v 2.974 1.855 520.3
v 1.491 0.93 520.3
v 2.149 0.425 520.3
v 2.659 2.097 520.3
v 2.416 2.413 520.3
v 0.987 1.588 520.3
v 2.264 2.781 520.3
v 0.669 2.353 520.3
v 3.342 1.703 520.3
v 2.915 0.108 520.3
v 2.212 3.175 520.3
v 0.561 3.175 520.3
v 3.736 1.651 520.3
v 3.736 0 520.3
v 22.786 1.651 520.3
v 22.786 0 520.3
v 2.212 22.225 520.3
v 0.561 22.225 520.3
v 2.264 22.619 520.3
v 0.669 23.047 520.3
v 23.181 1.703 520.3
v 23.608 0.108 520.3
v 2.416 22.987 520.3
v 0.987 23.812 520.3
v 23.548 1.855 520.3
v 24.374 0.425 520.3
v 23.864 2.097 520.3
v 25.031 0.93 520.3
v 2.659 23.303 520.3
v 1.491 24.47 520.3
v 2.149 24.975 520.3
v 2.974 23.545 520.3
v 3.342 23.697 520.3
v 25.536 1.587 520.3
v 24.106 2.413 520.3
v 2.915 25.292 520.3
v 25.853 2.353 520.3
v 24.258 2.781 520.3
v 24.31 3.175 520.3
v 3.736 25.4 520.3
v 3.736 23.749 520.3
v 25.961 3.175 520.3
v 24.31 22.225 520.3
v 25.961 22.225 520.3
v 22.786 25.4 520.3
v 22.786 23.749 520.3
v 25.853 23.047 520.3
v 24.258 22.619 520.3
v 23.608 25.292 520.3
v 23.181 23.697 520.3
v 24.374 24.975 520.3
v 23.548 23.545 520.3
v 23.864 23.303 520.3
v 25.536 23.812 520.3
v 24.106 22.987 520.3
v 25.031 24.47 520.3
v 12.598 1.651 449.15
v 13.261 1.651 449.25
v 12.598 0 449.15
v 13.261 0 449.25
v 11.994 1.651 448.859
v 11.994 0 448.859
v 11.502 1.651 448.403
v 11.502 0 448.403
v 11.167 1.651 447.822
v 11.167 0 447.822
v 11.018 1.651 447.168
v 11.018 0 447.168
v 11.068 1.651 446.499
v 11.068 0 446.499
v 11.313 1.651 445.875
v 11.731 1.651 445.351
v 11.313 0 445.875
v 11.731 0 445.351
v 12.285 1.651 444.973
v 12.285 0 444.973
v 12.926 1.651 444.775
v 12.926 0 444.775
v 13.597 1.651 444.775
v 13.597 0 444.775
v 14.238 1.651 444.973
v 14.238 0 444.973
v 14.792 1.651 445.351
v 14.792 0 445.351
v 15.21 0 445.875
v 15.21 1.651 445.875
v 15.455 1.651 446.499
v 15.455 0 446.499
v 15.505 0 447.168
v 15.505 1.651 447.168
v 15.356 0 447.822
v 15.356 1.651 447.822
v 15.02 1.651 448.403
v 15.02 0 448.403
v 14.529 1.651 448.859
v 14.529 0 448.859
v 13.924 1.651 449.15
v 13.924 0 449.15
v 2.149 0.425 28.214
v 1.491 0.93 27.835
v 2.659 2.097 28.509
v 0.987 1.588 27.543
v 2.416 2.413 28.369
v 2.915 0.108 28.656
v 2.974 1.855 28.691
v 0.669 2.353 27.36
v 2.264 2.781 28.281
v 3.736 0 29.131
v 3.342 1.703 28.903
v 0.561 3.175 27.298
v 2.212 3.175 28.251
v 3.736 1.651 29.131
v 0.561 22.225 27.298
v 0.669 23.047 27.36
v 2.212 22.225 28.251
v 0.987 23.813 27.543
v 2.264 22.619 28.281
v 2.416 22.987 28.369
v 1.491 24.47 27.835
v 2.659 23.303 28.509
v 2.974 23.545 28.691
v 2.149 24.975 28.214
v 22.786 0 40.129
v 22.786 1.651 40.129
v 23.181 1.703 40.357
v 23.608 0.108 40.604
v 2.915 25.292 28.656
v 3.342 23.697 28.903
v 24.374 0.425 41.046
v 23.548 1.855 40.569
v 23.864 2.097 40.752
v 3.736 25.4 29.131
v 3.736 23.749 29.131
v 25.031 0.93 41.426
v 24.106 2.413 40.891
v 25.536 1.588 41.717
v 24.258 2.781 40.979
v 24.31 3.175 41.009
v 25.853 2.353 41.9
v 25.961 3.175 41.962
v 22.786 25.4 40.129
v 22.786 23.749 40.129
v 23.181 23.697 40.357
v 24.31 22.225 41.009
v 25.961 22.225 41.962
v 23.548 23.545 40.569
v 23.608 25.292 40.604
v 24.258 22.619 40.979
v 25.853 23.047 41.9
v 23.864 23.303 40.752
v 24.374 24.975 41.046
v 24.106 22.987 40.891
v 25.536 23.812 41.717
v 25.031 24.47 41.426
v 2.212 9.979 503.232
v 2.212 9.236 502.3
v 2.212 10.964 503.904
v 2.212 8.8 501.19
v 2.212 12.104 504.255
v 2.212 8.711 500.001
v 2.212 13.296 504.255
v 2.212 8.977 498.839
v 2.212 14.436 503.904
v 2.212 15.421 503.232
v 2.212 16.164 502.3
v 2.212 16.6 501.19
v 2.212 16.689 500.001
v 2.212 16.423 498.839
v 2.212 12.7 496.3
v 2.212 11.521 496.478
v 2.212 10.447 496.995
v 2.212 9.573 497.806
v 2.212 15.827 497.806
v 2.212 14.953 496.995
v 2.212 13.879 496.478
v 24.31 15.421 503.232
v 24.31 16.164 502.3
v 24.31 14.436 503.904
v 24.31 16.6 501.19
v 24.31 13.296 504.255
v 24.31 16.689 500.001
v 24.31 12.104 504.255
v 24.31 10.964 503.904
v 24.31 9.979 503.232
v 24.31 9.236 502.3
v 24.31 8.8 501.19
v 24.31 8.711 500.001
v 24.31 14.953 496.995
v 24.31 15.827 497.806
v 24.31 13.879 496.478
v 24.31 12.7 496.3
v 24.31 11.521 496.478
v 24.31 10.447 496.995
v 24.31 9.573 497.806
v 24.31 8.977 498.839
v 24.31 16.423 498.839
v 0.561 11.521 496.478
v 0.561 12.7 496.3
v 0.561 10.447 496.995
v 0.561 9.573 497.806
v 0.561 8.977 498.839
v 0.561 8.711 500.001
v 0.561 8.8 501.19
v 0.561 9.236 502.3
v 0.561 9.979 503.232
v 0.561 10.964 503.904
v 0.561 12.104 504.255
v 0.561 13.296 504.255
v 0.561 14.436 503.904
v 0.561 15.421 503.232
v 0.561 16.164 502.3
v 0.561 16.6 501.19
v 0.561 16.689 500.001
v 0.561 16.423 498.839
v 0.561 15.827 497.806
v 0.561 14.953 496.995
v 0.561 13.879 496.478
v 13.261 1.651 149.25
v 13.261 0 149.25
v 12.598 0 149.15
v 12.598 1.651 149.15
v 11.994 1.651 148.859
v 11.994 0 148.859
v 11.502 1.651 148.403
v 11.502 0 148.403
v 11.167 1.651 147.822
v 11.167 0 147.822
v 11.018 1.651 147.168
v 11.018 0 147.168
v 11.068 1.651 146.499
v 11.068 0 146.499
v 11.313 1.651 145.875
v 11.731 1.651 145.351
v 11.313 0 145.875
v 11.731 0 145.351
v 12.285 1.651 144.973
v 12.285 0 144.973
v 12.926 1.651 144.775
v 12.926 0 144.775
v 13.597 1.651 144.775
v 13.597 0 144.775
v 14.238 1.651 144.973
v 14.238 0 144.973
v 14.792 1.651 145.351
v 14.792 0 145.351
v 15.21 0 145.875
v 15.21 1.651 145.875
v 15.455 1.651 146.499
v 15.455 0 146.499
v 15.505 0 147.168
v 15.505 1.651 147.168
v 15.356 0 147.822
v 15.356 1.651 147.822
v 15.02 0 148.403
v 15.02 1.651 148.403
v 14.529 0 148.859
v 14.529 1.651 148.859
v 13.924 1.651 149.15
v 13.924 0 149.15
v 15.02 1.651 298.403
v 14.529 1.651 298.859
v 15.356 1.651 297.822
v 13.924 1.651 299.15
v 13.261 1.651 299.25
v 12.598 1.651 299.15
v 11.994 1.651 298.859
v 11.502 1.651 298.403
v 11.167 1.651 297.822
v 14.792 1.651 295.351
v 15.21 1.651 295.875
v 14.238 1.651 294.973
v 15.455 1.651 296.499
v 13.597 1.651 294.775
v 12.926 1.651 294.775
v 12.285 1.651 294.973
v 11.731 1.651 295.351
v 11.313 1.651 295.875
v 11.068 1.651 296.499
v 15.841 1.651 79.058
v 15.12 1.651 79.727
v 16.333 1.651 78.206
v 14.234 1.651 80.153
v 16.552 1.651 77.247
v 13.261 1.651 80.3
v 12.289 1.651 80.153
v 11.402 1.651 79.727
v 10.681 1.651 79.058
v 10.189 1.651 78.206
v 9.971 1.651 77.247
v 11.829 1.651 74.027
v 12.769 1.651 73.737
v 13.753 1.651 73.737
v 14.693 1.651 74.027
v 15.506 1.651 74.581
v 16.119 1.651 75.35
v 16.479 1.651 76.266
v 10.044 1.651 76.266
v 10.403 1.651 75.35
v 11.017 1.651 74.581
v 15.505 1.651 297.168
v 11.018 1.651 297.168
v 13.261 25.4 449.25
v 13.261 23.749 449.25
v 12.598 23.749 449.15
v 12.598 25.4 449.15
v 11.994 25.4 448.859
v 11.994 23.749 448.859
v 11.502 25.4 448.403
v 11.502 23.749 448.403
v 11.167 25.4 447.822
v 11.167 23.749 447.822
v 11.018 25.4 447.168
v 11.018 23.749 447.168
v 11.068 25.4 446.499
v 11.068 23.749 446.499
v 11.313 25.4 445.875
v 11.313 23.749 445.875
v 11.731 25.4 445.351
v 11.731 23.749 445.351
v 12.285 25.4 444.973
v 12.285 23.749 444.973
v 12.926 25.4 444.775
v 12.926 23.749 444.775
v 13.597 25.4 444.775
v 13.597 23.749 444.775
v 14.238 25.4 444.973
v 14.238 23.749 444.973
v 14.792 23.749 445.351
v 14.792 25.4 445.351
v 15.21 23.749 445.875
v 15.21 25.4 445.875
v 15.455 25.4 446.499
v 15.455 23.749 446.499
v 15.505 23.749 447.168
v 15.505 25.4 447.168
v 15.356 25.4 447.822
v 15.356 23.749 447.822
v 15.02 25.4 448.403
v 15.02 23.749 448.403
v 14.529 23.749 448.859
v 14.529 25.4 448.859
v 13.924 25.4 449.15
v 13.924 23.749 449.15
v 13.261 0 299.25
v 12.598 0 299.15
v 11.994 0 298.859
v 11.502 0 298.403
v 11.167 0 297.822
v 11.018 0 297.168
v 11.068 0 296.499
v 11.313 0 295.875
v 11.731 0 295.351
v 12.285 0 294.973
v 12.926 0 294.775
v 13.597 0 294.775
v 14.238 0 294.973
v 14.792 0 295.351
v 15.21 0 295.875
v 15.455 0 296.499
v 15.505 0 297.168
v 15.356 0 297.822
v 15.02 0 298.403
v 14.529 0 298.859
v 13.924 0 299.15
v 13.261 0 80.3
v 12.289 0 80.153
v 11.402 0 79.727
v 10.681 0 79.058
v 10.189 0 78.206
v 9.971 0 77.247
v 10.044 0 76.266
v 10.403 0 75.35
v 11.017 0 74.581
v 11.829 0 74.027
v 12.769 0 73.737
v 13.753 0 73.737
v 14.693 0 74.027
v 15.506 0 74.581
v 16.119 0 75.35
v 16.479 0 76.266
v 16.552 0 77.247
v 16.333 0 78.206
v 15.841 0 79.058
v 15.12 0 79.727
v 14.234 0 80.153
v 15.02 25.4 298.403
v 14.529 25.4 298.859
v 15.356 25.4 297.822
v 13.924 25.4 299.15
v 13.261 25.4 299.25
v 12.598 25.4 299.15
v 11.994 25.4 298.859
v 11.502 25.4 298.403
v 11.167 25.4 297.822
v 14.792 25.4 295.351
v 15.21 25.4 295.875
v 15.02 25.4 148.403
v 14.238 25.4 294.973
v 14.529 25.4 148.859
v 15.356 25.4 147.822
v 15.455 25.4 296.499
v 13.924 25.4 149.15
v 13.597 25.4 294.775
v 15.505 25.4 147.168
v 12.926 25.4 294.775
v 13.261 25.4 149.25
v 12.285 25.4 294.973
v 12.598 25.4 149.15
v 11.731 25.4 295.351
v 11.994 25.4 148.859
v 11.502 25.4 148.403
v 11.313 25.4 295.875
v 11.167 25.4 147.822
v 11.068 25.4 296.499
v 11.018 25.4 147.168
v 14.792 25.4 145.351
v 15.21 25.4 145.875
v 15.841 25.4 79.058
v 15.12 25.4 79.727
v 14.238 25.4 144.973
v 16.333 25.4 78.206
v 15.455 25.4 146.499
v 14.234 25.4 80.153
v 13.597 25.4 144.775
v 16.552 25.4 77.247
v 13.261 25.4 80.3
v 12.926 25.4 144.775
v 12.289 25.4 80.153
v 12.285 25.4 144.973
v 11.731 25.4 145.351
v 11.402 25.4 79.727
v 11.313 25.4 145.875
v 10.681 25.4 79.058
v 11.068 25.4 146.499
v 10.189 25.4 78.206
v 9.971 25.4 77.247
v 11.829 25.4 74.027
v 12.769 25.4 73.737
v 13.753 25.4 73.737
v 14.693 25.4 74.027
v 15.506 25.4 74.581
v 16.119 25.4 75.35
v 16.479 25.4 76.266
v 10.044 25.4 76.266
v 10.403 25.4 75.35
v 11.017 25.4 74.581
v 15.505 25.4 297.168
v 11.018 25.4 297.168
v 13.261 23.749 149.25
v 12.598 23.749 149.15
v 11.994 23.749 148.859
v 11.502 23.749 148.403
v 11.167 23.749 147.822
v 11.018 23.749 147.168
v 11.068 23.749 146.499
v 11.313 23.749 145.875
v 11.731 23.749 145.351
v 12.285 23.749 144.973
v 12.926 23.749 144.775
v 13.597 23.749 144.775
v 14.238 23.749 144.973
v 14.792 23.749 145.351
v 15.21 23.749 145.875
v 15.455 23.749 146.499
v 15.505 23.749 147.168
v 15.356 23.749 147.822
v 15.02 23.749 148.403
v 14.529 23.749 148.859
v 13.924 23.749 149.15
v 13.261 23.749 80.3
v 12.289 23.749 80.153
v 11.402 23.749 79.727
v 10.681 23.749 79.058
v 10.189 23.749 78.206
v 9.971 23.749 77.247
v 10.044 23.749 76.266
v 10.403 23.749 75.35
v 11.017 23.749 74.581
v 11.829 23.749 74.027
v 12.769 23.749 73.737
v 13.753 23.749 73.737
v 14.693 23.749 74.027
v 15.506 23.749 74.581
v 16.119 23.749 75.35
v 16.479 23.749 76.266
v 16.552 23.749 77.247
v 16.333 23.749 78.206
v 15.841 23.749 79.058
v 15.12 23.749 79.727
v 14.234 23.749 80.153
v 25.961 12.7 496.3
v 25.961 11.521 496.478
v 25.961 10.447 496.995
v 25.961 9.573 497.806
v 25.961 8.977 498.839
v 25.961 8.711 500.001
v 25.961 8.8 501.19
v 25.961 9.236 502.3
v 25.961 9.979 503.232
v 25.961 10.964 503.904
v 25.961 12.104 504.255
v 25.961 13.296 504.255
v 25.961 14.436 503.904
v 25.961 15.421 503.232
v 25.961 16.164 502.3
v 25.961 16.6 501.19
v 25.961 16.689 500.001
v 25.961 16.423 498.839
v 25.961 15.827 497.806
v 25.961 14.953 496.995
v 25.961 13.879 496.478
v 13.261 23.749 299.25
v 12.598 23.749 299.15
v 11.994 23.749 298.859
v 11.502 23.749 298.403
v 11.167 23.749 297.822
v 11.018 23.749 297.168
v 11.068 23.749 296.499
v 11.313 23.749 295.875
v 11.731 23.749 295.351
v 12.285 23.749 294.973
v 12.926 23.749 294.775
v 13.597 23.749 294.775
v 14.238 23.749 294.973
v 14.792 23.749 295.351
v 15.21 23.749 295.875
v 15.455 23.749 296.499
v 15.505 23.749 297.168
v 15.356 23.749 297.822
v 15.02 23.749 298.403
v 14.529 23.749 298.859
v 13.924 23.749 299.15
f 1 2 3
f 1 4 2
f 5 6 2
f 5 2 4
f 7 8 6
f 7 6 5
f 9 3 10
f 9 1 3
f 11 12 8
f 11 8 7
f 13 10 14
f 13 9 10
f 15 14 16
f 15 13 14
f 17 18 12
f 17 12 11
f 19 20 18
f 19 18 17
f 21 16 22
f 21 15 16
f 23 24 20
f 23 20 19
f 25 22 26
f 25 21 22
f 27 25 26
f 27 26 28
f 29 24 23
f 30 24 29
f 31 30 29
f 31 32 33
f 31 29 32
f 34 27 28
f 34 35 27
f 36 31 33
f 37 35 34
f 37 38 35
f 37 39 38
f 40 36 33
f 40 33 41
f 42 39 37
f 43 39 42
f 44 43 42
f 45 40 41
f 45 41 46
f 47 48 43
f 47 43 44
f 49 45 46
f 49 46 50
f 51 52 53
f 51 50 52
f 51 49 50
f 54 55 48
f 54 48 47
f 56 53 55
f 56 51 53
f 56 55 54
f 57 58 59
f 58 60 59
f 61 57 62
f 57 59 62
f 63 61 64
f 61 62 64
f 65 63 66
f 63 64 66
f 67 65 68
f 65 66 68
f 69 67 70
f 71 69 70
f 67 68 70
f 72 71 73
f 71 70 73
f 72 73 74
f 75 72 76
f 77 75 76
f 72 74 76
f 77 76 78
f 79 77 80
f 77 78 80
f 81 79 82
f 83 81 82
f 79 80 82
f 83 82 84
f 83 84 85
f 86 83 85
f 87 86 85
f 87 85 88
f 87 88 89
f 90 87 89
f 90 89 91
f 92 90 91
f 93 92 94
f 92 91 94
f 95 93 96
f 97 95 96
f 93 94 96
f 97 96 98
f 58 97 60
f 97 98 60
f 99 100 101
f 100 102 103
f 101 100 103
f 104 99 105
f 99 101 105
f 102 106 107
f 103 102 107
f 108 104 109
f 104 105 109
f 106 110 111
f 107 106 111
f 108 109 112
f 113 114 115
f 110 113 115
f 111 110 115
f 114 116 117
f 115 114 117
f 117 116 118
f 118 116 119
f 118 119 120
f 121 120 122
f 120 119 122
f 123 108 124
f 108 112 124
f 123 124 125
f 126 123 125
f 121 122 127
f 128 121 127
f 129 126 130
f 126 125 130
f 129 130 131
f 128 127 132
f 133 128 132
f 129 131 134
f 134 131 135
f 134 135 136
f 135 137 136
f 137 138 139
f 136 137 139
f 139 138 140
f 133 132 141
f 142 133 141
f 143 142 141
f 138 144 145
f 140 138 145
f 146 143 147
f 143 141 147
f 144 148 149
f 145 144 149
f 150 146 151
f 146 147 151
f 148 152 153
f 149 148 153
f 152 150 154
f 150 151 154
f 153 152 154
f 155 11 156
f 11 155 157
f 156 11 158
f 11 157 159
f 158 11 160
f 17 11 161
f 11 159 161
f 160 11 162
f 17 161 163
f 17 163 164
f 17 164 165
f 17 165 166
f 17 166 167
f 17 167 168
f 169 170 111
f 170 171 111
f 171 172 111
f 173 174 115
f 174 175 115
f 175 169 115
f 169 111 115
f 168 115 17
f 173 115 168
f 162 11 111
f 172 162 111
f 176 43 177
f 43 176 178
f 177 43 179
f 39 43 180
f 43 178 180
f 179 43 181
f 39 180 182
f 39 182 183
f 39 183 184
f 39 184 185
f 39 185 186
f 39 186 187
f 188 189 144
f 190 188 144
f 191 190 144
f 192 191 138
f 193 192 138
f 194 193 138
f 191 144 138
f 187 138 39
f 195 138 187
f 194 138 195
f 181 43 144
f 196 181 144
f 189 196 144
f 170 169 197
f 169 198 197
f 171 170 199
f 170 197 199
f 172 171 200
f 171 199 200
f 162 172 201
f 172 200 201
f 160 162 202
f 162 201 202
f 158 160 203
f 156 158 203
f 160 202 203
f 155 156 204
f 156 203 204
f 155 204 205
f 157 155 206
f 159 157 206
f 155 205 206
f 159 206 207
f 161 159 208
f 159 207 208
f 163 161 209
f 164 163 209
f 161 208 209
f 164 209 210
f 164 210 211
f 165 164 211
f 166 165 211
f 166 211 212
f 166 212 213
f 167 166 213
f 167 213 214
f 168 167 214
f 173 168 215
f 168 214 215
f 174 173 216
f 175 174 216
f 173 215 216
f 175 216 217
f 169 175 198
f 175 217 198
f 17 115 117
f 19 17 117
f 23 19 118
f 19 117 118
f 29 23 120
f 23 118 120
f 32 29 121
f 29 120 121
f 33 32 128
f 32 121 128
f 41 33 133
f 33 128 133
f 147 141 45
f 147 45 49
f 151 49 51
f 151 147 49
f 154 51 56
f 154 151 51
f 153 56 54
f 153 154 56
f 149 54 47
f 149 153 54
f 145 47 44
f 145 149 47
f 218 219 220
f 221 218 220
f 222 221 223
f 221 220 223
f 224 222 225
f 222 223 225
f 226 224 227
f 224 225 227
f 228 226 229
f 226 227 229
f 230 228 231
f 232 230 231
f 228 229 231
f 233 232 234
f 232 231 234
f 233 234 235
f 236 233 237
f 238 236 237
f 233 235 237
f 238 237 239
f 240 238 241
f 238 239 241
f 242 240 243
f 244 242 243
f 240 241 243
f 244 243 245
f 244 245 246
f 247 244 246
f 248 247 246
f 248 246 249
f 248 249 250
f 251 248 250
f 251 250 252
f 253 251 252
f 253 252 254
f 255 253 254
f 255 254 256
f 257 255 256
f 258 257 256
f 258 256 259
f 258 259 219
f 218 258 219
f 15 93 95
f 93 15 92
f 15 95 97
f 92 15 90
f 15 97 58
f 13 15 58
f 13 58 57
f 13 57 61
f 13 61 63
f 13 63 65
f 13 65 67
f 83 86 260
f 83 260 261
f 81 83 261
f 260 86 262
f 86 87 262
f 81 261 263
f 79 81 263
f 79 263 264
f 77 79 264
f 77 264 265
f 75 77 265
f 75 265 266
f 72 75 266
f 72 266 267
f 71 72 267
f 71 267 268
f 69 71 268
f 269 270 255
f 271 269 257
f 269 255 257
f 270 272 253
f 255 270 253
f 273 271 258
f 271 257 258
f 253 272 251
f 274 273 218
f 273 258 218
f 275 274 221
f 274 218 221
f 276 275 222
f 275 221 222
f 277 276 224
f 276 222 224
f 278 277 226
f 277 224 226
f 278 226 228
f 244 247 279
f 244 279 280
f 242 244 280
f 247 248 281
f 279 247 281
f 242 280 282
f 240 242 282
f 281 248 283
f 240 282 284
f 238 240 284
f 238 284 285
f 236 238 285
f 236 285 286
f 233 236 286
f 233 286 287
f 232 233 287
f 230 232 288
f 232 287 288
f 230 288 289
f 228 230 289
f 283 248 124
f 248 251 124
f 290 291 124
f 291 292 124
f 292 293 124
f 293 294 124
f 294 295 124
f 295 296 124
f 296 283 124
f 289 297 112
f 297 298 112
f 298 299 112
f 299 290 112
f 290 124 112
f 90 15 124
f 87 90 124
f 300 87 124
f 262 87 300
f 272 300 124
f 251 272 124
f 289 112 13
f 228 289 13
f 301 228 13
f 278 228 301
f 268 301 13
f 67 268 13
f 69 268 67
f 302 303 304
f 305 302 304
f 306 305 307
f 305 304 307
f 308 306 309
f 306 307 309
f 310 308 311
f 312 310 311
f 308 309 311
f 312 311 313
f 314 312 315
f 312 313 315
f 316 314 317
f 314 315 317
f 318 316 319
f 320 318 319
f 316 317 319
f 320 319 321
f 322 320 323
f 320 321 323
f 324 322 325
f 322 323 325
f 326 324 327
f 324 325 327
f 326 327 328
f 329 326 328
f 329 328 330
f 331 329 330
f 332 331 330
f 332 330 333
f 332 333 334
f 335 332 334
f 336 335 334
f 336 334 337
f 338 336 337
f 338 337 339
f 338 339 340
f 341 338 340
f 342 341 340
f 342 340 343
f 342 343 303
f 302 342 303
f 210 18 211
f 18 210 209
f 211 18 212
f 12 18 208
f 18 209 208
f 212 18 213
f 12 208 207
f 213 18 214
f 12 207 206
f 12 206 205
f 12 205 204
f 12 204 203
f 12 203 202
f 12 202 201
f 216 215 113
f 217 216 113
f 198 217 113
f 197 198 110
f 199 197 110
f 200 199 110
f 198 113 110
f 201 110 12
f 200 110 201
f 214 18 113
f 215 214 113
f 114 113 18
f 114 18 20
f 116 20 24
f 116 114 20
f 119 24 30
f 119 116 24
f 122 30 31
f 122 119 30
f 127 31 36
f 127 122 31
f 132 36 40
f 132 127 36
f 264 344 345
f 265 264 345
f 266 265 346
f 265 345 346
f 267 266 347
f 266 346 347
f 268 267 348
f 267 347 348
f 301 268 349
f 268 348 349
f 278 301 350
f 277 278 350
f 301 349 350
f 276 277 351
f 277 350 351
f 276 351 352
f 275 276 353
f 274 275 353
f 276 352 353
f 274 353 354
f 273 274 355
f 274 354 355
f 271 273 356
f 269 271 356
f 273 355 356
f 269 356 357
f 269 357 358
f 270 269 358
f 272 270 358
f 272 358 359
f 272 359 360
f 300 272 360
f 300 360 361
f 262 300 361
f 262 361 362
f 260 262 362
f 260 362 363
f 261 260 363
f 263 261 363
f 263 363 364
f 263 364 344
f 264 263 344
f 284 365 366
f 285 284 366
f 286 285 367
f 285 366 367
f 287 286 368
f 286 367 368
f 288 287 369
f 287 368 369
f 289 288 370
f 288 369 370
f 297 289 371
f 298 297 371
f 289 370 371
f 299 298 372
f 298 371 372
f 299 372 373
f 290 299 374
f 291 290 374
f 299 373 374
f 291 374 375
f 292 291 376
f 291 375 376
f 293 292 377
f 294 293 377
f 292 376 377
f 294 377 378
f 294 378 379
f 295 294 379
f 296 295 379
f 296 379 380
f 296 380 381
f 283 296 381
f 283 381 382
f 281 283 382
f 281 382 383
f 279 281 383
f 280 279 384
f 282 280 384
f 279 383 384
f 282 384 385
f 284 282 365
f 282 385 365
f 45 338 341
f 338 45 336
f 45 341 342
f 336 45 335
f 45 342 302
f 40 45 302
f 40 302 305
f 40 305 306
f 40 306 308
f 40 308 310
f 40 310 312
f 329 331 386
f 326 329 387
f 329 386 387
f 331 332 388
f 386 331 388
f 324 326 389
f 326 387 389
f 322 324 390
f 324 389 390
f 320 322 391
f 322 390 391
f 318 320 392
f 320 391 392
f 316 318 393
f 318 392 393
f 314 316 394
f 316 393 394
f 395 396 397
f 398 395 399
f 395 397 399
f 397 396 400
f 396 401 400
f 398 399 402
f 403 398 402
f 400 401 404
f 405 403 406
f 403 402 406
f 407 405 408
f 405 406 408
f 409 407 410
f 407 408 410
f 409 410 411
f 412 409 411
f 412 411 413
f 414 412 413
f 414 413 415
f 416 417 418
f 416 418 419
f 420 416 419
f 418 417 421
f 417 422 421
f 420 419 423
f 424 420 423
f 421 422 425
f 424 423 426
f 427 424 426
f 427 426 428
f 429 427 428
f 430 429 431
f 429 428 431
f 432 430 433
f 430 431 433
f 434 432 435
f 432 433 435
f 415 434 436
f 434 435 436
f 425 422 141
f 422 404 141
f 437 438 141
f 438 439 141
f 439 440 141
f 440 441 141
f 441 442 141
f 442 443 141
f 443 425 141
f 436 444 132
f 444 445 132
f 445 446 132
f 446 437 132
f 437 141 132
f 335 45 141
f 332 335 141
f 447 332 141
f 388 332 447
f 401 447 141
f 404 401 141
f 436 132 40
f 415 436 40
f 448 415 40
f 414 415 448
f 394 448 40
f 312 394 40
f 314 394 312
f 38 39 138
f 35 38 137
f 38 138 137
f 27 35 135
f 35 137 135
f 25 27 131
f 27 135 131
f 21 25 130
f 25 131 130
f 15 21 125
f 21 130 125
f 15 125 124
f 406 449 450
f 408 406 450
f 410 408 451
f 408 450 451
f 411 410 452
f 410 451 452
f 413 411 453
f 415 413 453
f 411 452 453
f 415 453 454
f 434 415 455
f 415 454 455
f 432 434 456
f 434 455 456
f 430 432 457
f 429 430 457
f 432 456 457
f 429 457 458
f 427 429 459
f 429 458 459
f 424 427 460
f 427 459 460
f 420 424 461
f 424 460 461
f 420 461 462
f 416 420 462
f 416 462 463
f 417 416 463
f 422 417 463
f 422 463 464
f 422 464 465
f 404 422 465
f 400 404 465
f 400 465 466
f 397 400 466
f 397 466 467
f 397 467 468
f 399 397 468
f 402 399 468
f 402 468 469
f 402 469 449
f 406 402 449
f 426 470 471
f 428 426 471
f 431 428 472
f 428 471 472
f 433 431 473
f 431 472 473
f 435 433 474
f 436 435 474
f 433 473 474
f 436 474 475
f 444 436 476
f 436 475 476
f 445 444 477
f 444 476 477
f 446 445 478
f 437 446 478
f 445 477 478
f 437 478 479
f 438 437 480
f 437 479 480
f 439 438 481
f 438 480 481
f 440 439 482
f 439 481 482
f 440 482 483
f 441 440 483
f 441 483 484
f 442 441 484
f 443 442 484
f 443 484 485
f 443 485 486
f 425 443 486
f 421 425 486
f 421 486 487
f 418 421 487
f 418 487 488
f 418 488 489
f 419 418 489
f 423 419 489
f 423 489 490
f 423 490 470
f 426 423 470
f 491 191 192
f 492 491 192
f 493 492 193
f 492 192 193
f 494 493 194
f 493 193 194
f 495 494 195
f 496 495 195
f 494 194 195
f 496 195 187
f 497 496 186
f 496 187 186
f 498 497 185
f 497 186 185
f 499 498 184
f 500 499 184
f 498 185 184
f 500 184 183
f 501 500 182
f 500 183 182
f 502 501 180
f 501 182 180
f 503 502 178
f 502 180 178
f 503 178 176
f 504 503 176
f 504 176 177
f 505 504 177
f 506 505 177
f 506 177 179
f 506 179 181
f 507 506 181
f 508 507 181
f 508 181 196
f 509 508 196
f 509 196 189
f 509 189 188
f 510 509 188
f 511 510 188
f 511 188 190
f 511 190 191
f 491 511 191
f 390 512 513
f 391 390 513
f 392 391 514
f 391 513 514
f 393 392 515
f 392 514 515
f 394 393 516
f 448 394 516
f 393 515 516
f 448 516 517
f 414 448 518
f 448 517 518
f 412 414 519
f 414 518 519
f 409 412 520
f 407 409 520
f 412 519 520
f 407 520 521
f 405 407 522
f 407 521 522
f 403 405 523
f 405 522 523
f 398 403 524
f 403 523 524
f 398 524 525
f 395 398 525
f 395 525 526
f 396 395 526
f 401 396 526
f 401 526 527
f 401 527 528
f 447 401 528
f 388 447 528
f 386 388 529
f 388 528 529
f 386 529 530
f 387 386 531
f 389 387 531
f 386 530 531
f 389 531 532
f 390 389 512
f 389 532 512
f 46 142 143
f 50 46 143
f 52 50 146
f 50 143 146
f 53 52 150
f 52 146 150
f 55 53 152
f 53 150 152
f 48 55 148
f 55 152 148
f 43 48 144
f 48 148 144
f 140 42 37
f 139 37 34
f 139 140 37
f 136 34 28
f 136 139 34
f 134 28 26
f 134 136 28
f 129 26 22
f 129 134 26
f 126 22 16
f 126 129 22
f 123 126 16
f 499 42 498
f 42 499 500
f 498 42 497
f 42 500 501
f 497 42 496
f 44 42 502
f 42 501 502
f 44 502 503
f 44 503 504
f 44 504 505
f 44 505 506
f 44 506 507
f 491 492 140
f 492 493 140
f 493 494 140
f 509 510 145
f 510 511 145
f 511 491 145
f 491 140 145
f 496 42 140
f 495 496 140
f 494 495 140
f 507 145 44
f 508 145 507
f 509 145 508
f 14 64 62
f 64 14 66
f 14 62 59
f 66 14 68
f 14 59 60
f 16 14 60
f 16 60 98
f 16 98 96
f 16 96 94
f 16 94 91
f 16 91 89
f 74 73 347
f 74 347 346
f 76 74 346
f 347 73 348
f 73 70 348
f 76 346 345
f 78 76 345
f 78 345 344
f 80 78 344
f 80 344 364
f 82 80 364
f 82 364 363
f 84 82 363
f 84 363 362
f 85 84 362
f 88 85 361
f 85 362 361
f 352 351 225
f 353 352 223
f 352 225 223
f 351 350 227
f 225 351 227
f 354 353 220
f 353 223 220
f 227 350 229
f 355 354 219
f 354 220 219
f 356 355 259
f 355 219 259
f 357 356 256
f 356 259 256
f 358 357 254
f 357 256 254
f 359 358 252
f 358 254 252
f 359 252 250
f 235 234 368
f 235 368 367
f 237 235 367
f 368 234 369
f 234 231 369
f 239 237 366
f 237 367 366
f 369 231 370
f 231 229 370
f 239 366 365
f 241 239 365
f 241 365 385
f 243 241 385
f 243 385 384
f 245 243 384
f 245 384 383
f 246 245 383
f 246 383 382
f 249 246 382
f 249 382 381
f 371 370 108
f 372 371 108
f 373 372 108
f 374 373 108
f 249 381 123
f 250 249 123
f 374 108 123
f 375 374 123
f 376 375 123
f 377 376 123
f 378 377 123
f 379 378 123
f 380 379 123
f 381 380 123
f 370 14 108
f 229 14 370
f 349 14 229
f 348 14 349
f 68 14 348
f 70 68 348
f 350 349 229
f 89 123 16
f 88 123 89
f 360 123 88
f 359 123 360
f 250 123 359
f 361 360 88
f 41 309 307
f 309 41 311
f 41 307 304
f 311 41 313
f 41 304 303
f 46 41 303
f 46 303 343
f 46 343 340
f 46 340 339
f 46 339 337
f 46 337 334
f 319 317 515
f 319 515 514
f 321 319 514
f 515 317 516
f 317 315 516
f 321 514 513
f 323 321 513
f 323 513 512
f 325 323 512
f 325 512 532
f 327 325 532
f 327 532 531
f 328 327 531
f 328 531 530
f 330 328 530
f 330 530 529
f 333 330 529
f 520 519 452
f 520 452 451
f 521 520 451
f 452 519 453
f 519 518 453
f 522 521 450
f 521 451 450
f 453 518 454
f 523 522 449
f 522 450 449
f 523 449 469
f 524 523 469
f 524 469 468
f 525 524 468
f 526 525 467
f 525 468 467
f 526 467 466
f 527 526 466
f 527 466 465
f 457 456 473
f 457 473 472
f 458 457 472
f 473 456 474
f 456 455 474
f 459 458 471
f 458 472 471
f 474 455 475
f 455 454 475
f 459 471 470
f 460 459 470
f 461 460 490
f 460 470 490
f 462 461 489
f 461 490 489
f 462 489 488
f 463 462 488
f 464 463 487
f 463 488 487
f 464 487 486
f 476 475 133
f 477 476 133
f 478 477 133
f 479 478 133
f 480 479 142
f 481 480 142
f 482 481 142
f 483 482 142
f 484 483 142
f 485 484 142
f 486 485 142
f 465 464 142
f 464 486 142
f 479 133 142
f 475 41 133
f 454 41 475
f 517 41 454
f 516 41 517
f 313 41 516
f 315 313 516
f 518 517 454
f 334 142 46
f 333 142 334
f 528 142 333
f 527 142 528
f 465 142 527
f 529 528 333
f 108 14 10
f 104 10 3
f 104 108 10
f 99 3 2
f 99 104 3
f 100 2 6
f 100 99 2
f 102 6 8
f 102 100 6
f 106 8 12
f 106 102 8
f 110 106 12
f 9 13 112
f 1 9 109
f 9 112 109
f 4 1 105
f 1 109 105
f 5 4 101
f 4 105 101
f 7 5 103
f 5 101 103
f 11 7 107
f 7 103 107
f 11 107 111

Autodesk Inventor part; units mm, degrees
ref_plane "YZ Plane" through (0, 0, 0) normal (1, 0, 0) x (0, 1, 0)
ref_plane "XZ Plane" through (0, 0, 0) normal (0, 1, 0) x (-1, 0, 0)
ref_plane "XY Plane" through (0, 0, 0) normal (0, 0, 1) x (1, 0, 0)
sketch "Sketch1" plane through (0, 0, 0) normal (0, 0, 1) x (1, 0, 0)
  line L0 (3.7363, 0) -> (22.7863, 0)
  line L1 (25.9613, 3.175) -> (25.9613, 22.225)
  line L2 (22.7863, 25.4) -> (3.7363, 25.4)
  line L3 (0.5613, 22.225) -> (0.5613, 3.175)
  arc A0 (3.7363, 25.4) -> (0.5613, 22.225) centre (3.7363, 22.225) ccw
  arc A1 (0.5613, 3.175) -> (3.7363, 0) centre (3.7363, 3.175) ccw
  arc A2 (22.7863, 0) -> (25.9613, 3.175) centre (22.7863, 3.175) ccw
  arc A3 (25.9613, 22.225) -> (22.7863, 25.4) centre (22.7863, 22.225) ccw
  line L4 (3.7363, 23.749) -> (22.7863, 23.749)
  arc A4 (24.3103, 22.225) -> (22.7863, 23.749) centre (22.7863, 22.225) ccw
  line L5 (24.3103, 22.225) -> (24.3103, 3.175)
  arc A5 (22.7863, 1.651) -> (24.3103, 3.175) centre (22.7863, 3.175) ccw
  line L6 (22.7863, 1.651) -> (3.7363, 1.651)
  arc A6 (2.2123, 3.175) -> (3.7363, 1.651) centre (3.7363, 3.175) ccw
  line L7 (2.2123, 3.175) -> (2.2123, 22.225)
  arc A7 (3.7363, 23.749) -> (2.2123, 22.225) centre (3.7363, 22.225) ccw
  point P0 (0, 0)
  point P1 (0.5613, 0)
  point P2 (25.9613, 0)
  point P3 (0.5613, 25.4)
  dimension "d0" = 25.4
  dimension "d2" = 25.4
  dimension "d3" = 3.175
  dimension "d4" = 1.651
extrude "tube" add sketch "Sketch1" along normal blind 520.3
sketch "Sketch11" plane through (3.7363, 25.4, 0) normal (0, 1, 0) x (1, 0, 0)
  line L0 (19.05, 0) -> (0, 0) projected
  circle A0 centre (9.525, -20) radius 2.8743
  point P0 (-3.7363, 0)
  dimension "d83" = 20
hole "centerHole_cutOff" at (13.2613, 25.4, 20) direction (0, -1, 0) diameter 6.35 end through all
sketch "Sketch12" plane through (3.7363, 25.4, 0) normal (0, 1, 0) x (1, 0, 0)
  circle A0 centre (9.525, -20) radius 3.175 projected
  circle A1 centre (9.525, -77) radius 2.5235
  point P0 (-3.7363, 0)
  dimension "d91" = 57
hole "collarHole" at (13.2613, 25.4, 77) direction (0, -1, 0) diameter 6.6 end through all clearance for "Hex Head Bolt" size "M6" standard "Ansi Metric M Profile"
sketch "Sketch8" plane through (3.7363, 25.4, 520.3) normal (0, 1, 0) x (1, 0, 0)
  line L0 (0, 520.3) -> (0, 0) projected
  circle A0 centre (9.525, 73.3) radius 1.5875
  circle A1 centre (9.525, 223.3) radius 1.5875
  circle A2 centre (9.525, 373.3) radius 1.5875
  circle A3 centre (9.525, 500.3) radius 3.175 projected
  point P0 (0, 518.1689)
  point P1 (-3.7363, 520.3)
  dimension "d43" = 3.175
  dimension "d47" = 150
  dimension "d99" = 127
hole "armAttach" at (13.2613, 25.4, 447) at (13.2613, 25.4, 297) at (13.2613, 25.4, 147) direction (0, -1, 0) diameter 4.5 end through all clearance for "Flat Head Machine Screw" size "M4" standard "Ansi Metric M Profile"
sketch "Sketch6" plane through (25.9613, 3.175, 520.3) normal (1, 0, 0) x (0, 0, -1)
  line L0 (0, 0) -> (0, 19.05) projected
  circle A0 centre (20, 9.525) radius 2.9685
  point P0 (520.3, -3.175)
  dimension "d27" = 20
hole "ropeAttach" at (25.9613, 12.7, 500.3) direction (-1, 0, 0) diameter 8 end through all
sketch "Sketch13" plane through (3.7363, 25.4, 0) normal (0, 1, 0) x (1, 0, 0)
  circle A0 centre (9.525, -20) radius 3.175 projected
  line L0 (9.525, -20) -> (9.525, -34.6812) construction
  line L1 (-12.9518, -21.6531) -> (31.0422, -47.0531)
  line L2 (0, -34.6812) -> (50.8, -34.6812) construction
  line L3 (-12.9518, 4.6365) -> (31.0422, 4.6365)
  line L4 (31.0422, -47.0531) -> (31.0422, 4.6365)
  line L5 (-12.9518, 4.6365) -> (-12.9518, -21.6531)
  point P0 (-3.7363, 0)
  dimension "d100" = 14.6812
  dimension "d101" = 50.8
  dimension "d102" = 30
extrude "angledEnd" cut sketch "Sketch13" against normal blind 50.8
equation "\"d0\" = tube"
equation "\"d2\" = tube"
equation "\"tube\" = 25.4"
properties part number "2f2ax1" material "Steel"
